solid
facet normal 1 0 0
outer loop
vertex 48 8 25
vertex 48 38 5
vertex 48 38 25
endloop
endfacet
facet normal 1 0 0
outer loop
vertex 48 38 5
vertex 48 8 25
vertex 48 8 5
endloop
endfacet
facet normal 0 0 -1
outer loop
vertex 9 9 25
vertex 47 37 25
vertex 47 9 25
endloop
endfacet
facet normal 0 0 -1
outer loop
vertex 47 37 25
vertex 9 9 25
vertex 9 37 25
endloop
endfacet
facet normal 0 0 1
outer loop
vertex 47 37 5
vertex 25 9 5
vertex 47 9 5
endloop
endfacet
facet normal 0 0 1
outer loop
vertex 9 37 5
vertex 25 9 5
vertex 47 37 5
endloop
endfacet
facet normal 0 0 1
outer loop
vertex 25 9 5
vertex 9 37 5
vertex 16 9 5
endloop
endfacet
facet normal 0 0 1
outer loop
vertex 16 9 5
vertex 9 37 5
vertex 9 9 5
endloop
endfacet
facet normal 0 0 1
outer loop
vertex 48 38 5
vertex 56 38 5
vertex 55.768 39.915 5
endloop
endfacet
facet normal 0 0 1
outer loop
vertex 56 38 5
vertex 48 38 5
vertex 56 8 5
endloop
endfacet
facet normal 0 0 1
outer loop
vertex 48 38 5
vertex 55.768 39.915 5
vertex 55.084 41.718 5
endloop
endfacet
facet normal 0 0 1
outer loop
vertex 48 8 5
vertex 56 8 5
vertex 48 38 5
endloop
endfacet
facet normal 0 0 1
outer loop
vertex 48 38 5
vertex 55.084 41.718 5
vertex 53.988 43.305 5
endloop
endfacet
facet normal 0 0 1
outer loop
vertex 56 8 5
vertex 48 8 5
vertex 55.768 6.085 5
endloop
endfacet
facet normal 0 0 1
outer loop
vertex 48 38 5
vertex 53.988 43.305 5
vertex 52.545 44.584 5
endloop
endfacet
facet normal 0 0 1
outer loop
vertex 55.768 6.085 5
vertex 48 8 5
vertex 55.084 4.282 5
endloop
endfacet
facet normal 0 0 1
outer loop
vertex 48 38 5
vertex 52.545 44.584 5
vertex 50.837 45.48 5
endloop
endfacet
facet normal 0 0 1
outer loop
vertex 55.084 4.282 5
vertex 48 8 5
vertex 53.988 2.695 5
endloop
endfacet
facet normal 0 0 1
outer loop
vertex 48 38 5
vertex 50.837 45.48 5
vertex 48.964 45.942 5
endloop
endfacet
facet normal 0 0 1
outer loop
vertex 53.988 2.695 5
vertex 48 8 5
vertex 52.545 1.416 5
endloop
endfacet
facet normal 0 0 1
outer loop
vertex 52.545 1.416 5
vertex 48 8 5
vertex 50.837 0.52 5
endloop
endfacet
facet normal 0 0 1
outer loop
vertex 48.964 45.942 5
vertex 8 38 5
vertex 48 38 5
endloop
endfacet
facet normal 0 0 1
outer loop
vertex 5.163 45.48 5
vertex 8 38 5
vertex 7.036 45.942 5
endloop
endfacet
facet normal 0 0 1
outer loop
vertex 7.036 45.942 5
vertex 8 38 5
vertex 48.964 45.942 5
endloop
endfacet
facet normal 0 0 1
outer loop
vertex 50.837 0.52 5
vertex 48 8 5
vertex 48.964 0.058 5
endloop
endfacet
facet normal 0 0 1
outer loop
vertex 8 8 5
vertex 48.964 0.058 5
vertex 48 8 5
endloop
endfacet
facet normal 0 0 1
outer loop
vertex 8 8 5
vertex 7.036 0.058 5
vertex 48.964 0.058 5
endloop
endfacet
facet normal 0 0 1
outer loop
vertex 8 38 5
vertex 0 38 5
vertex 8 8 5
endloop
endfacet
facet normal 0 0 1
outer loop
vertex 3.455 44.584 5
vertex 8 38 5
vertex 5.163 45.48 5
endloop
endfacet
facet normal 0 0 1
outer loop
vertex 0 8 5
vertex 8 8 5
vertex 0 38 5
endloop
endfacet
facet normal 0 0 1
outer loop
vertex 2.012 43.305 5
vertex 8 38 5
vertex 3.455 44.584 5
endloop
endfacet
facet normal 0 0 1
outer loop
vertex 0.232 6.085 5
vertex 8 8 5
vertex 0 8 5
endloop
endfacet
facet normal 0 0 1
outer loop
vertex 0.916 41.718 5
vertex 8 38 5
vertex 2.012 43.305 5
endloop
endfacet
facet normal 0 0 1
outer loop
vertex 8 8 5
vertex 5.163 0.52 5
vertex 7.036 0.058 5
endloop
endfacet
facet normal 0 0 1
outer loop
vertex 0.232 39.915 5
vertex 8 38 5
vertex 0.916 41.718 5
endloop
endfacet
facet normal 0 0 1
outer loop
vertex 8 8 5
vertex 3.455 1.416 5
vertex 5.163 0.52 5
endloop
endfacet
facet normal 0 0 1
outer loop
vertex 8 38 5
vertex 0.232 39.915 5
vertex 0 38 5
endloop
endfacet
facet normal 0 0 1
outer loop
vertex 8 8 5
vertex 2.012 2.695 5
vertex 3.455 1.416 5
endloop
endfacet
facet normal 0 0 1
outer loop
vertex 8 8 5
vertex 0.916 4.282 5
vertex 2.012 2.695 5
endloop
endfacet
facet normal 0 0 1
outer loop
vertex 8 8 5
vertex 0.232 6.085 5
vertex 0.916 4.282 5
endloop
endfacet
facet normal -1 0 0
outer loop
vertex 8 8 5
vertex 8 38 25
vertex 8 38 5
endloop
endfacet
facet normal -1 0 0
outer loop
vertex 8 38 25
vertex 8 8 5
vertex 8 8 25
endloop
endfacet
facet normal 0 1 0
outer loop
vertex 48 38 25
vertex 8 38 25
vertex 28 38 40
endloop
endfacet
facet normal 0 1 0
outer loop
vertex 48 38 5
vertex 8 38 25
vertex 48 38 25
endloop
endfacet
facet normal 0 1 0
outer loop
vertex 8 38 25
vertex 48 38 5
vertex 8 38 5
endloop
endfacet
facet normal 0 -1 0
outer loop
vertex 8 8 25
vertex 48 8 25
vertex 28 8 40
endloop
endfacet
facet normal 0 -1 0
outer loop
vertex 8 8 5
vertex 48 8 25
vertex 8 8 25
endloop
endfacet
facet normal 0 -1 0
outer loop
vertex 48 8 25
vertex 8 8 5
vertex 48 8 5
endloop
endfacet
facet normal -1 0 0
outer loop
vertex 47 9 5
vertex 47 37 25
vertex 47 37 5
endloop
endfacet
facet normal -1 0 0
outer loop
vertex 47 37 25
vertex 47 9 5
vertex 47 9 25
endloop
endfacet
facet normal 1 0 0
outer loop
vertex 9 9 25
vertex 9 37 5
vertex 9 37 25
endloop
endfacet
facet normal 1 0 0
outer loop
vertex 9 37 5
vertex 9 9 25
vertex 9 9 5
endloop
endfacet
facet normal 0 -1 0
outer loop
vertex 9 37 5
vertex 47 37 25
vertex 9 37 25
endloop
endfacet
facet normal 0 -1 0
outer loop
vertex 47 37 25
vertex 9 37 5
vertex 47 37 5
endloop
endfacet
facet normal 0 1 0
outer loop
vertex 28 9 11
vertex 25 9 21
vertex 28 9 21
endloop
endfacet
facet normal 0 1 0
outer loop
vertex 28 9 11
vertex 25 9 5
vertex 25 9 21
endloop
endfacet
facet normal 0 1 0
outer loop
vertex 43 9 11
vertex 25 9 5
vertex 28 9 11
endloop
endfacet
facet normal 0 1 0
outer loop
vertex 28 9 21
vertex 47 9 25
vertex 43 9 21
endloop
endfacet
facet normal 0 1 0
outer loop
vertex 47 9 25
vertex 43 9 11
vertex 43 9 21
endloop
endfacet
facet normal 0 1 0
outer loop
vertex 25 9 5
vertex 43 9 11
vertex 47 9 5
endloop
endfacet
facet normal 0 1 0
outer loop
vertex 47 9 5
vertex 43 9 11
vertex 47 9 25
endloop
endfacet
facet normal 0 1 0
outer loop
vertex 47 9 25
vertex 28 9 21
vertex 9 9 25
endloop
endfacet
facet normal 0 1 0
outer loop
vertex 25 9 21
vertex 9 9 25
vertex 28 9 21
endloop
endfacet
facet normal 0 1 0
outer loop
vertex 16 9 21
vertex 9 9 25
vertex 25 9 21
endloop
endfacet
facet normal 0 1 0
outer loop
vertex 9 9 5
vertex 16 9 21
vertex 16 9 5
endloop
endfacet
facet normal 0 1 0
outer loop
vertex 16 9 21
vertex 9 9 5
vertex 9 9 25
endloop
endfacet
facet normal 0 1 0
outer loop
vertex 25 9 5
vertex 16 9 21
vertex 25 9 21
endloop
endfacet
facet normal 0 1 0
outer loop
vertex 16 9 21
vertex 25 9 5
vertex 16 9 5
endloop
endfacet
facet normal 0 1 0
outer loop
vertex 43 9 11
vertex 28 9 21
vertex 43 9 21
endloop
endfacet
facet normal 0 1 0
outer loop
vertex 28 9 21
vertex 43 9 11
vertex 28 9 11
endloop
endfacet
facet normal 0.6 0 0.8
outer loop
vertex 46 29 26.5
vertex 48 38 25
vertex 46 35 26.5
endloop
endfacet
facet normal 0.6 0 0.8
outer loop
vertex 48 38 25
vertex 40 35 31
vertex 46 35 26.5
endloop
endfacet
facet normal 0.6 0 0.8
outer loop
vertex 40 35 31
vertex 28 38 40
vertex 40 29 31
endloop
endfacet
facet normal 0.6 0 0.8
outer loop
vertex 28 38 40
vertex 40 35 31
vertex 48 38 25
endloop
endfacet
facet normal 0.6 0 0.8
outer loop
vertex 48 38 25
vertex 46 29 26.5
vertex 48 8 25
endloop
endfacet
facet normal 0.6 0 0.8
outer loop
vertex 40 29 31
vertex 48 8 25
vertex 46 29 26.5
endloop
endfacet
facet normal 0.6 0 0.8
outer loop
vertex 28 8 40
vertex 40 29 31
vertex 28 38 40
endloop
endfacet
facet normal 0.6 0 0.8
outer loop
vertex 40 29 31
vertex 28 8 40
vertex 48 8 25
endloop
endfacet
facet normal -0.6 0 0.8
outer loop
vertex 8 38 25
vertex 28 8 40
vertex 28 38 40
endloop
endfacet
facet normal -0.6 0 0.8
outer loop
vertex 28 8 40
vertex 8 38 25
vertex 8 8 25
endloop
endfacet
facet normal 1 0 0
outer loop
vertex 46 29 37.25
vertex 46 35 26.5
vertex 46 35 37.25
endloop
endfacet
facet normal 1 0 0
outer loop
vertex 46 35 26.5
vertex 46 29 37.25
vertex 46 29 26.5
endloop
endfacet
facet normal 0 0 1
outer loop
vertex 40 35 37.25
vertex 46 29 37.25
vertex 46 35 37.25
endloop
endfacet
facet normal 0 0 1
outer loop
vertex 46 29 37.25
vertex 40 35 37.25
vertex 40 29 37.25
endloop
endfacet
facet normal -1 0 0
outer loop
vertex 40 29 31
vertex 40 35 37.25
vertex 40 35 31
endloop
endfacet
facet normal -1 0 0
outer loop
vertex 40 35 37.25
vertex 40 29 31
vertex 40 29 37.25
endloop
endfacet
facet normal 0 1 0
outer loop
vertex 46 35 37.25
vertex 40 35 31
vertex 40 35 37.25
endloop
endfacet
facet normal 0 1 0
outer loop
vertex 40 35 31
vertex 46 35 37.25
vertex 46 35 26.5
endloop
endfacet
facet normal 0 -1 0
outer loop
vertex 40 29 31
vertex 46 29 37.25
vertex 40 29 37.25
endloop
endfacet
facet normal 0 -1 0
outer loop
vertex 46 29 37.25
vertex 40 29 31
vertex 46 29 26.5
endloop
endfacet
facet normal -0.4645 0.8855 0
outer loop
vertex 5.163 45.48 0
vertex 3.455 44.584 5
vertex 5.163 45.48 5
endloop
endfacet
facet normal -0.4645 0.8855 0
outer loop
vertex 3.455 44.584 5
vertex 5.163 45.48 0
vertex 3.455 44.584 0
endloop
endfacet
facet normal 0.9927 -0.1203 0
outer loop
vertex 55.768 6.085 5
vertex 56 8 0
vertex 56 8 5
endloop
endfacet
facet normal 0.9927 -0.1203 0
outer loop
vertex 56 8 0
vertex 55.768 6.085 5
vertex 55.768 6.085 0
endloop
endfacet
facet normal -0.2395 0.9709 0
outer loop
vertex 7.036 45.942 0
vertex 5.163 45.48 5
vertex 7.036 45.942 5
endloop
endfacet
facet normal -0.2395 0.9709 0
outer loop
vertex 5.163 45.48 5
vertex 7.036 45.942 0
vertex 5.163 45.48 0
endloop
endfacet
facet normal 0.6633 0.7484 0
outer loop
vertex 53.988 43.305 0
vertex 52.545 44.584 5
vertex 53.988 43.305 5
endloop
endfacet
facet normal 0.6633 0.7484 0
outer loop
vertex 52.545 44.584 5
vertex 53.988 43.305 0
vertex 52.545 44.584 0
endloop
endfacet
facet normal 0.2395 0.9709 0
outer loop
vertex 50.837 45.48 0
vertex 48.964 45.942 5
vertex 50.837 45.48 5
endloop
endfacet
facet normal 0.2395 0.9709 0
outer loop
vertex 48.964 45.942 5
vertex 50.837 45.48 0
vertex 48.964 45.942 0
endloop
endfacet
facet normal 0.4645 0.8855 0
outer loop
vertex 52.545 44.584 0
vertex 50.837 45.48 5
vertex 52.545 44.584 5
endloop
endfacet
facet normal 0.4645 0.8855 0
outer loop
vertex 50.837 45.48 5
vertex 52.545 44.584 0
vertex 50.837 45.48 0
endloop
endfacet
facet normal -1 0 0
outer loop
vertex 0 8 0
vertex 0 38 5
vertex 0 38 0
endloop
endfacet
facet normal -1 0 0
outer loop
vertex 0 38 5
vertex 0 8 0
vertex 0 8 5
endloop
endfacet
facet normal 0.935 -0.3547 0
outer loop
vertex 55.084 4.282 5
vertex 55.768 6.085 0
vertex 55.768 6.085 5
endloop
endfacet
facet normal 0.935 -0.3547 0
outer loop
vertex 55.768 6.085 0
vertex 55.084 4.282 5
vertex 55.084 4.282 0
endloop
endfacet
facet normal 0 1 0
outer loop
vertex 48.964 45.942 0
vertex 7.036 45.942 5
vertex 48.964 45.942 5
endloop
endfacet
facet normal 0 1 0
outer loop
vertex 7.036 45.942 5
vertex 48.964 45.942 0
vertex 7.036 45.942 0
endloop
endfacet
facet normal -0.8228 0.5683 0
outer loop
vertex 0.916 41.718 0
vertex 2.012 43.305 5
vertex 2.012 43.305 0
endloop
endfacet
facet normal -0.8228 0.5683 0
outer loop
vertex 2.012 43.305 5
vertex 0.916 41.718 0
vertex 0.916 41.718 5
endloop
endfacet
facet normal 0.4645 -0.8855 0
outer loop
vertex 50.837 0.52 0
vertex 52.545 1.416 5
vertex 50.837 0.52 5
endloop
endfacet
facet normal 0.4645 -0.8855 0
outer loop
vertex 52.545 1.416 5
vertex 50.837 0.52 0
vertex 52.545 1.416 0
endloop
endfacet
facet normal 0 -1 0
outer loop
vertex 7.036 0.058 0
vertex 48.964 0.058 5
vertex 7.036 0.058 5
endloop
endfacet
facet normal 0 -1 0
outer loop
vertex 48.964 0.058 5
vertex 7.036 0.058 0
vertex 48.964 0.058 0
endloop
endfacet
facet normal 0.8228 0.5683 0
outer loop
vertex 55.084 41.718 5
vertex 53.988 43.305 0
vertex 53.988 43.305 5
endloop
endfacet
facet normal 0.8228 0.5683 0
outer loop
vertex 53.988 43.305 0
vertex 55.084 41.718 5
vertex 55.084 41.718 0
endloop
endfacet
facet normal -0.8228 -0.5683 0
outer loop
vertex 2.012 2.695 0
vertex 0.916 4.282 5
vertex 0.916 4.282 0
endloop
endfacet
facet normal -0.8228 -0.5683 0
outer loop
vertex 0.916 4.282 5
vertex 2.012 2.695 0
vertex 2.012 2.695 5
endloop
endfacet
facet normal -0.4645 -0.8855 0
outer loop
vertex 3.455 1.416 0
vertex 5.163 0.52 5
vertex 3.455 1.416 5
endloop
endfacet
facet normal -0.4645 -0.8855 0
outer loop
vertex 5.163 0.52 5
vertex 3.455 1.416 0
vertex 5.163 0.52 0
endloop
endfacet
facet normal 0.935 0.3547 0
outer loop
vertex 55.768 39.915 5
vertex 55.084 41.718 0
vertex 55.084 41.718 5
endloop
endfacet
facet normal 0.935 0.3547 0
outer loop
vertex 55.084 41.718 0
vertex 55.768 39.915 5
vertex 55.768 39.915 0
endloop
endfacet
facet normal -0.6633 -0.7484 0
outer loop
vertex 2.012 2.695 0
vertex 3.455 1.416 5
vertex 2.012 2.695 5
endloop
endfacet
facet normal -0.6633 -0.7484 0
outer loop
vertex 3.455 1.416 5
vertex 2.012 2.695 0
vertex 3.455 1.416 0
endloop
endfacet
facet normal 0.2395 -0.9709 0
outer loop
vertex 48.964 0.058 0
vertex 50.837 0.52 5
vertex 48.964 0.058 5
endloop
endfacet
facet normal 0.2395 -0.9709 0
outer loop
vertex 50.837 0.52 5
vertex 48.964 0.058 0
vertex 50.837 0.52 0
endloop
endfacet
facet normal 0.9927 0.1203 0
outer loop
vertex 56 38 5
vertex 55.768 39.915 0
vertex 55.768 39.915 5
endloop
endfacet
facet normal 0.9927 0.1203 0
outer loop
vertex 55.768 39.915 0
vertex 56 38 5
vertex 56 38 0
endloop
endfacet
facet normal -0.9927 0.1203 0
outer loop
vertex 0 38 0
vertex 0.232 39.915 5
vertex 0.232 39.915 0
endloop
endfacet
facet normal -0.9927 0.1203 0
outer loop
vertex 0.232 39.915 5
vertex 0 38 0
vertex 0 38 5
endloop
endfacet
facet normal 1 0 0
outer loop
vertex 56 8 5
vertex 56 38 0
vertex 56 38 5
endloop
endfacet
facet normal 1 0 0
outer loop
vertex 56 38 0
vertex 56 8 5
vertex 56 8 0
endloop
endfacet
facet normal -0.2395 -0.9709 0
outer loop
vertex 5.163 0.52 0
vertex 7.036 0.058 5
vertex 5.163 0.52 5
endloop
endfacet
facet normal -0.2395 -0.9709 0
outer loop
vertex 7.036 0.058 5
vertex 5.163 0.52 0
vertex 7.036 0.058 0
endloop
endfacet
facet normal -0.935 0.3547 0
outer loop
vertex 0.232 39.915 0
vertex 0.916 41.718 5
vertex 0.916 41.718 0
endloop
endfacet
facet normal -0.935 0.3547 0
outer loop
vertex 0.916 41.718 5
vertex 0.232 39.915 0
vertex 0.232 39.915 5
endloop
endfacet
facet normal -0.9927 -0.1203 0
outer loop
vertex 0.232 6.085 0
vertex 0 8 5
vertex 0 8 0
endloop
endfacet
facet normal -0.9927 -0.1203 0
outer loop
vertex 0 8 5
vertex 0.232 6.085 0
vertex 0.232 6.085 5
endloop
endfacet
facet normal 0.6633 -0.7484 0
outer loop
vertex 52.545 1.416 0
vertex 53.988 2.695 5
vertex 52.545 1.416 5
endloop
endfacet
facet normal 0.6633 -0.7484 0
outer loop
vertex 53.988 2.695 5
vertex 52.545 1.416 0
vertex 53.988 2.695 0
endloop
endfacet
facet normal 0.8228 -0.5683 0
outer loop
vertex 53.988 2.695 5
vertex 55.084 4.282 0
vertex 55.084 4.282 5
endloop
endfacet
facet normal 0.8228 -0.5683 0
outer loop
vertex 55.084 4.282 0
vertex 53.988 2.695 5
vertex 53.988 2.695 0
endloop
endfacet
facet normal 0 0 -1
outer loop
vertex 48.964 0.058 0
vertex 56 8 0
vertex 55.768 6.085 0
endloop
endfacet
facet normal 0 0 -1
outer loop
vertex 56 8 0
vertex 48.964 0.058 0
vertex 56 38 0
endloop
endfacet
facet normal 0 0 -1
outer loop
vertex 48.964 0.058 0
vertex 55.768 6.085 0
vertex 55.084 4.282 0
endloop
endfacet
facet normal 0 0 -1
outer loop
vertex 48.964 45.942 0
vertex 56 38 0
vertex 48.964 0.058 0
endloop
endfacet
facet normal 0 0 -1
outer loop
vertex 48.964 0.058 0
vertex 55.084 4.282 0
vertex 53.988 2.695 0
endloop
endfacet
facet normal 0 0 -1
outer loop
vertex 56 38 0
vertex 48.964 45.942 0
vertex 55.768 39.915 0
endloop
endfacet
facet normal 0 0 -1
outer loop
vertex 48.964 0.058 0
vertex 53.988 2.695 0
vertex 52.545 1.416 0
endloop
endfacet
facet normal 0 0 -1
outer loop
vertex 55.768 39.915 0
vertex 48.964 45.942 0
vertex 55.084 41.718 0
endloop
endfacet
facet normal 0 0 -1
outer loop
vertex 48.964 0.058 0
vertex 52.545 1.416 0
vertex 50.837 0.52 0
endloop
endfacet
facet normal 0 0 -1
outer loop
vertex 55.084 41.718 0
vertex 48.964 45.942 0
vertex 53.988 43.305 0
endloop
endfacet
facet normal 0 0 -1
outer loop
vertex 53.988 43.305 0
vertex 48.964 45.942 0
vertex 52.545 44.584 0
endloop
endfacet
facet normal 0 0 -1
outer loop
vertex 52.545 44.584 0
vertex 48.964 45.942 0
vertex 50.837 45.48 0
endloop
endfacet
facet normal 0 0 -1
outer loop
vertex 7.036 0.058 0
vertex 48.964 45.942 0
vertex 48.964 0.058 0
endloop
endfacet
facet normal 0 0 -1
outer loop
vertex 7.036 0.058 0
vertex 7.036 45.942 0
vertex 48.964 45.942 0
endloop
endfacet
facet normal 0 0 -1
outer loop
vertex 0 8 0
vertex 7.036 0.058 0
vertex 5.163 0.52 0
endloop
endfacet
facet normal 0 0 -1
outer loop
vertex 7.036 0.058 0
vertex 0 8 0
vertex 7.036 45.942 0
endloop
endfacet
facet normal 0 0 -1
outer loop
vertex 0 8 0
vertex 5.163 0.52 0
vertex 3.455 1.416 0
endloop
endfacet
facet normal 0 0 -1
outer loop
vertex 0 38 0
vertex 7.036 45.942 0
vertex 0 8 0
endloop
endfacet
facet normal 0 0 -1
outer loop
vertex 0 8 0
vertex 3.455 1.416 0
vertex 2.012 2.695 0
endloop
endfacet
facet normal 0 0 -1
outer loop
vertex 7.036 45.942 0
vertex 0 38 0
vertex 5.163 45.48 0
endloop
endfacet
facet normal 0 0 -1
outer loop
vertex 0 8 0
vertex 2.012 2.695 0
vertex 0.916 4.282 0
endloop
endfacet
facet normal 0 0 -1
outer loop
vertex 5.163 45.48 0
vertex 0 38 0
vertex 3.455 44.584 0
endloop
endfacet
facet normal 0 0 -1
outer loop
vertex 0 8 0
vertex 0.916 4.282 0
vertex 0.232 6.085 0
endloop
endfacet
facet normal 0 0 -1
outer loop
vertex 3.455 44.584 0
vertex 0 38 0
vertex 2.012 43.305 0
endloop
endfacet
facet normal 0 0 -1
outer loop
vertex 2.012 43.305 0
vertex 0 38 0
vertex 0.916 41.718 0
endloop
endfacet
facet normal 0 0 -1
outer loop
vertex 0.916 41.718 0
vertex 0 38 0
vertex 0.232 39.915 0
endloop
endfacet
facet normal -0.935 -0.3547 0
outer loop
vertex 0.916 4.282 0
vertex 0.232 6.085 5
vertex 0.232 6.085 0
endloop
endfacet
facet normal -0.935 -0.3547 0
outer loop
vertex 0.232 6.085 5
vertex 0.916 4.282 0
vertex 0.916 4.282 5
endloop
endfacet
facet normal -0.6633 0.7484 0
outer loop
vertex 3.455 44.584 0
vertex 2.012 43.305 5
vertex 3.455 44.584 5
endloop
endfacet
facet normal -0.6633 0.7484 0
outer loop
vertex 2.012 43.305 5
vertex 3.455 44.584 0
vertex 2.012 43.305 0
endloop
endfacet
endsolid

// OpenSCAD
/*****************************************************************************
** OpenSCAD Example Code by Michal Altair Valasek - https://www.rider.cz    **
** Licensed under terms of Creative Commons Attribution License (cc-by)     **
** https://creativecommons.org/licenses/by/4.0/                             **
*****************************************************************************/

base_width = 40;    // X
base_depth = 30;    // Y
base_height = 20;   // Z
wall = 1;
roof_height = 15;   // Z
door_width = 9;     // X
door_height = 16;   // Z
window_width = 15;  // X
window_height = 10; // Z
window_bottom = 6;  // Z offset
chimney_size = 6;   // X, Y
grass_offset = 8;   // X, Y offset
grass_height = 5;   // Z

house();

module house() {
    grass();
    translate([grass_offset, grass_offset, grass_height]) {
        base();
        translate([0, 0, base_height]) roof();
        translate([base_width * .8, base_depth * .7, base_height + 1]) chimney();
    }
}

module base() {
    difference() {
        // Home shell
        color("yellow") cube([base_width, base_depth, base_height]);
        translate([wall, wall, -1]) cube([base_width - 2 * wall, base_depth - 2 * wall, base_height + 2]);

        // Door hole
        translate([base_width / 5, -1, -1]) cube([door_width, wall + 2, door_height + 1]);

        // Window hole
        translate([base_width / 2, -1, window_bottom]) cube([window_width, wall + 2, window_height]);
    }

    // Door
    color("brown") translate([base_width / 5, 0, 0]) cube([door_width, wall, door_height]);

    // Window
    color("blue", .25) translate([base_width / 2, 0, window_bottom]) cube([window_width, wall, window_height]);
}

module roof() {
    points = [ 
        [0, 0, 0], [base_width, 0, 0], [base_width, base_depth, 0], [0, base_depth, 0], // base corners
        [base_width / 2, 0, roof_height], [base_width / 2, base_depth, roof_height]      // roof corners
    ];
    faces = [ 
        [0, 1, 2, 3],   // base
        [3, 4, 0],      // left triangle
        [1, 5, 2],      // right triangle
        [4, 5, 1, 0],   // front side,
        [5, 4, 3, 2]    // back side
    ];
    color("red") polyhedron(points, faces, convexity = 10);
}

module chimney() {
    color("black") cube([chimney_size, chimney_size, roof_height * .75]);
}

module grass(){
    color("green") rcube([base_width + 2 * grass_offset, base_depth + 2 * grass_offset, grass_height], grass_offset);
}

module rcube(size, radius) {
    if(radius < 1){
        cube(size);
    } else {
        hull() {
            translate([radius, radius]) cylinder(r = radius, h = size[2]);
            translate([size[0] - radius, radius]) cylinder(r = radius, h = size[2]);
            translate([size[0] - radius, size[1] - radius]) cylinder(r = radius, h = size[2]);
            translate([radius, size[1] - radius]) cylinder(r = radius, h = size[2]);
        }
    }
}
